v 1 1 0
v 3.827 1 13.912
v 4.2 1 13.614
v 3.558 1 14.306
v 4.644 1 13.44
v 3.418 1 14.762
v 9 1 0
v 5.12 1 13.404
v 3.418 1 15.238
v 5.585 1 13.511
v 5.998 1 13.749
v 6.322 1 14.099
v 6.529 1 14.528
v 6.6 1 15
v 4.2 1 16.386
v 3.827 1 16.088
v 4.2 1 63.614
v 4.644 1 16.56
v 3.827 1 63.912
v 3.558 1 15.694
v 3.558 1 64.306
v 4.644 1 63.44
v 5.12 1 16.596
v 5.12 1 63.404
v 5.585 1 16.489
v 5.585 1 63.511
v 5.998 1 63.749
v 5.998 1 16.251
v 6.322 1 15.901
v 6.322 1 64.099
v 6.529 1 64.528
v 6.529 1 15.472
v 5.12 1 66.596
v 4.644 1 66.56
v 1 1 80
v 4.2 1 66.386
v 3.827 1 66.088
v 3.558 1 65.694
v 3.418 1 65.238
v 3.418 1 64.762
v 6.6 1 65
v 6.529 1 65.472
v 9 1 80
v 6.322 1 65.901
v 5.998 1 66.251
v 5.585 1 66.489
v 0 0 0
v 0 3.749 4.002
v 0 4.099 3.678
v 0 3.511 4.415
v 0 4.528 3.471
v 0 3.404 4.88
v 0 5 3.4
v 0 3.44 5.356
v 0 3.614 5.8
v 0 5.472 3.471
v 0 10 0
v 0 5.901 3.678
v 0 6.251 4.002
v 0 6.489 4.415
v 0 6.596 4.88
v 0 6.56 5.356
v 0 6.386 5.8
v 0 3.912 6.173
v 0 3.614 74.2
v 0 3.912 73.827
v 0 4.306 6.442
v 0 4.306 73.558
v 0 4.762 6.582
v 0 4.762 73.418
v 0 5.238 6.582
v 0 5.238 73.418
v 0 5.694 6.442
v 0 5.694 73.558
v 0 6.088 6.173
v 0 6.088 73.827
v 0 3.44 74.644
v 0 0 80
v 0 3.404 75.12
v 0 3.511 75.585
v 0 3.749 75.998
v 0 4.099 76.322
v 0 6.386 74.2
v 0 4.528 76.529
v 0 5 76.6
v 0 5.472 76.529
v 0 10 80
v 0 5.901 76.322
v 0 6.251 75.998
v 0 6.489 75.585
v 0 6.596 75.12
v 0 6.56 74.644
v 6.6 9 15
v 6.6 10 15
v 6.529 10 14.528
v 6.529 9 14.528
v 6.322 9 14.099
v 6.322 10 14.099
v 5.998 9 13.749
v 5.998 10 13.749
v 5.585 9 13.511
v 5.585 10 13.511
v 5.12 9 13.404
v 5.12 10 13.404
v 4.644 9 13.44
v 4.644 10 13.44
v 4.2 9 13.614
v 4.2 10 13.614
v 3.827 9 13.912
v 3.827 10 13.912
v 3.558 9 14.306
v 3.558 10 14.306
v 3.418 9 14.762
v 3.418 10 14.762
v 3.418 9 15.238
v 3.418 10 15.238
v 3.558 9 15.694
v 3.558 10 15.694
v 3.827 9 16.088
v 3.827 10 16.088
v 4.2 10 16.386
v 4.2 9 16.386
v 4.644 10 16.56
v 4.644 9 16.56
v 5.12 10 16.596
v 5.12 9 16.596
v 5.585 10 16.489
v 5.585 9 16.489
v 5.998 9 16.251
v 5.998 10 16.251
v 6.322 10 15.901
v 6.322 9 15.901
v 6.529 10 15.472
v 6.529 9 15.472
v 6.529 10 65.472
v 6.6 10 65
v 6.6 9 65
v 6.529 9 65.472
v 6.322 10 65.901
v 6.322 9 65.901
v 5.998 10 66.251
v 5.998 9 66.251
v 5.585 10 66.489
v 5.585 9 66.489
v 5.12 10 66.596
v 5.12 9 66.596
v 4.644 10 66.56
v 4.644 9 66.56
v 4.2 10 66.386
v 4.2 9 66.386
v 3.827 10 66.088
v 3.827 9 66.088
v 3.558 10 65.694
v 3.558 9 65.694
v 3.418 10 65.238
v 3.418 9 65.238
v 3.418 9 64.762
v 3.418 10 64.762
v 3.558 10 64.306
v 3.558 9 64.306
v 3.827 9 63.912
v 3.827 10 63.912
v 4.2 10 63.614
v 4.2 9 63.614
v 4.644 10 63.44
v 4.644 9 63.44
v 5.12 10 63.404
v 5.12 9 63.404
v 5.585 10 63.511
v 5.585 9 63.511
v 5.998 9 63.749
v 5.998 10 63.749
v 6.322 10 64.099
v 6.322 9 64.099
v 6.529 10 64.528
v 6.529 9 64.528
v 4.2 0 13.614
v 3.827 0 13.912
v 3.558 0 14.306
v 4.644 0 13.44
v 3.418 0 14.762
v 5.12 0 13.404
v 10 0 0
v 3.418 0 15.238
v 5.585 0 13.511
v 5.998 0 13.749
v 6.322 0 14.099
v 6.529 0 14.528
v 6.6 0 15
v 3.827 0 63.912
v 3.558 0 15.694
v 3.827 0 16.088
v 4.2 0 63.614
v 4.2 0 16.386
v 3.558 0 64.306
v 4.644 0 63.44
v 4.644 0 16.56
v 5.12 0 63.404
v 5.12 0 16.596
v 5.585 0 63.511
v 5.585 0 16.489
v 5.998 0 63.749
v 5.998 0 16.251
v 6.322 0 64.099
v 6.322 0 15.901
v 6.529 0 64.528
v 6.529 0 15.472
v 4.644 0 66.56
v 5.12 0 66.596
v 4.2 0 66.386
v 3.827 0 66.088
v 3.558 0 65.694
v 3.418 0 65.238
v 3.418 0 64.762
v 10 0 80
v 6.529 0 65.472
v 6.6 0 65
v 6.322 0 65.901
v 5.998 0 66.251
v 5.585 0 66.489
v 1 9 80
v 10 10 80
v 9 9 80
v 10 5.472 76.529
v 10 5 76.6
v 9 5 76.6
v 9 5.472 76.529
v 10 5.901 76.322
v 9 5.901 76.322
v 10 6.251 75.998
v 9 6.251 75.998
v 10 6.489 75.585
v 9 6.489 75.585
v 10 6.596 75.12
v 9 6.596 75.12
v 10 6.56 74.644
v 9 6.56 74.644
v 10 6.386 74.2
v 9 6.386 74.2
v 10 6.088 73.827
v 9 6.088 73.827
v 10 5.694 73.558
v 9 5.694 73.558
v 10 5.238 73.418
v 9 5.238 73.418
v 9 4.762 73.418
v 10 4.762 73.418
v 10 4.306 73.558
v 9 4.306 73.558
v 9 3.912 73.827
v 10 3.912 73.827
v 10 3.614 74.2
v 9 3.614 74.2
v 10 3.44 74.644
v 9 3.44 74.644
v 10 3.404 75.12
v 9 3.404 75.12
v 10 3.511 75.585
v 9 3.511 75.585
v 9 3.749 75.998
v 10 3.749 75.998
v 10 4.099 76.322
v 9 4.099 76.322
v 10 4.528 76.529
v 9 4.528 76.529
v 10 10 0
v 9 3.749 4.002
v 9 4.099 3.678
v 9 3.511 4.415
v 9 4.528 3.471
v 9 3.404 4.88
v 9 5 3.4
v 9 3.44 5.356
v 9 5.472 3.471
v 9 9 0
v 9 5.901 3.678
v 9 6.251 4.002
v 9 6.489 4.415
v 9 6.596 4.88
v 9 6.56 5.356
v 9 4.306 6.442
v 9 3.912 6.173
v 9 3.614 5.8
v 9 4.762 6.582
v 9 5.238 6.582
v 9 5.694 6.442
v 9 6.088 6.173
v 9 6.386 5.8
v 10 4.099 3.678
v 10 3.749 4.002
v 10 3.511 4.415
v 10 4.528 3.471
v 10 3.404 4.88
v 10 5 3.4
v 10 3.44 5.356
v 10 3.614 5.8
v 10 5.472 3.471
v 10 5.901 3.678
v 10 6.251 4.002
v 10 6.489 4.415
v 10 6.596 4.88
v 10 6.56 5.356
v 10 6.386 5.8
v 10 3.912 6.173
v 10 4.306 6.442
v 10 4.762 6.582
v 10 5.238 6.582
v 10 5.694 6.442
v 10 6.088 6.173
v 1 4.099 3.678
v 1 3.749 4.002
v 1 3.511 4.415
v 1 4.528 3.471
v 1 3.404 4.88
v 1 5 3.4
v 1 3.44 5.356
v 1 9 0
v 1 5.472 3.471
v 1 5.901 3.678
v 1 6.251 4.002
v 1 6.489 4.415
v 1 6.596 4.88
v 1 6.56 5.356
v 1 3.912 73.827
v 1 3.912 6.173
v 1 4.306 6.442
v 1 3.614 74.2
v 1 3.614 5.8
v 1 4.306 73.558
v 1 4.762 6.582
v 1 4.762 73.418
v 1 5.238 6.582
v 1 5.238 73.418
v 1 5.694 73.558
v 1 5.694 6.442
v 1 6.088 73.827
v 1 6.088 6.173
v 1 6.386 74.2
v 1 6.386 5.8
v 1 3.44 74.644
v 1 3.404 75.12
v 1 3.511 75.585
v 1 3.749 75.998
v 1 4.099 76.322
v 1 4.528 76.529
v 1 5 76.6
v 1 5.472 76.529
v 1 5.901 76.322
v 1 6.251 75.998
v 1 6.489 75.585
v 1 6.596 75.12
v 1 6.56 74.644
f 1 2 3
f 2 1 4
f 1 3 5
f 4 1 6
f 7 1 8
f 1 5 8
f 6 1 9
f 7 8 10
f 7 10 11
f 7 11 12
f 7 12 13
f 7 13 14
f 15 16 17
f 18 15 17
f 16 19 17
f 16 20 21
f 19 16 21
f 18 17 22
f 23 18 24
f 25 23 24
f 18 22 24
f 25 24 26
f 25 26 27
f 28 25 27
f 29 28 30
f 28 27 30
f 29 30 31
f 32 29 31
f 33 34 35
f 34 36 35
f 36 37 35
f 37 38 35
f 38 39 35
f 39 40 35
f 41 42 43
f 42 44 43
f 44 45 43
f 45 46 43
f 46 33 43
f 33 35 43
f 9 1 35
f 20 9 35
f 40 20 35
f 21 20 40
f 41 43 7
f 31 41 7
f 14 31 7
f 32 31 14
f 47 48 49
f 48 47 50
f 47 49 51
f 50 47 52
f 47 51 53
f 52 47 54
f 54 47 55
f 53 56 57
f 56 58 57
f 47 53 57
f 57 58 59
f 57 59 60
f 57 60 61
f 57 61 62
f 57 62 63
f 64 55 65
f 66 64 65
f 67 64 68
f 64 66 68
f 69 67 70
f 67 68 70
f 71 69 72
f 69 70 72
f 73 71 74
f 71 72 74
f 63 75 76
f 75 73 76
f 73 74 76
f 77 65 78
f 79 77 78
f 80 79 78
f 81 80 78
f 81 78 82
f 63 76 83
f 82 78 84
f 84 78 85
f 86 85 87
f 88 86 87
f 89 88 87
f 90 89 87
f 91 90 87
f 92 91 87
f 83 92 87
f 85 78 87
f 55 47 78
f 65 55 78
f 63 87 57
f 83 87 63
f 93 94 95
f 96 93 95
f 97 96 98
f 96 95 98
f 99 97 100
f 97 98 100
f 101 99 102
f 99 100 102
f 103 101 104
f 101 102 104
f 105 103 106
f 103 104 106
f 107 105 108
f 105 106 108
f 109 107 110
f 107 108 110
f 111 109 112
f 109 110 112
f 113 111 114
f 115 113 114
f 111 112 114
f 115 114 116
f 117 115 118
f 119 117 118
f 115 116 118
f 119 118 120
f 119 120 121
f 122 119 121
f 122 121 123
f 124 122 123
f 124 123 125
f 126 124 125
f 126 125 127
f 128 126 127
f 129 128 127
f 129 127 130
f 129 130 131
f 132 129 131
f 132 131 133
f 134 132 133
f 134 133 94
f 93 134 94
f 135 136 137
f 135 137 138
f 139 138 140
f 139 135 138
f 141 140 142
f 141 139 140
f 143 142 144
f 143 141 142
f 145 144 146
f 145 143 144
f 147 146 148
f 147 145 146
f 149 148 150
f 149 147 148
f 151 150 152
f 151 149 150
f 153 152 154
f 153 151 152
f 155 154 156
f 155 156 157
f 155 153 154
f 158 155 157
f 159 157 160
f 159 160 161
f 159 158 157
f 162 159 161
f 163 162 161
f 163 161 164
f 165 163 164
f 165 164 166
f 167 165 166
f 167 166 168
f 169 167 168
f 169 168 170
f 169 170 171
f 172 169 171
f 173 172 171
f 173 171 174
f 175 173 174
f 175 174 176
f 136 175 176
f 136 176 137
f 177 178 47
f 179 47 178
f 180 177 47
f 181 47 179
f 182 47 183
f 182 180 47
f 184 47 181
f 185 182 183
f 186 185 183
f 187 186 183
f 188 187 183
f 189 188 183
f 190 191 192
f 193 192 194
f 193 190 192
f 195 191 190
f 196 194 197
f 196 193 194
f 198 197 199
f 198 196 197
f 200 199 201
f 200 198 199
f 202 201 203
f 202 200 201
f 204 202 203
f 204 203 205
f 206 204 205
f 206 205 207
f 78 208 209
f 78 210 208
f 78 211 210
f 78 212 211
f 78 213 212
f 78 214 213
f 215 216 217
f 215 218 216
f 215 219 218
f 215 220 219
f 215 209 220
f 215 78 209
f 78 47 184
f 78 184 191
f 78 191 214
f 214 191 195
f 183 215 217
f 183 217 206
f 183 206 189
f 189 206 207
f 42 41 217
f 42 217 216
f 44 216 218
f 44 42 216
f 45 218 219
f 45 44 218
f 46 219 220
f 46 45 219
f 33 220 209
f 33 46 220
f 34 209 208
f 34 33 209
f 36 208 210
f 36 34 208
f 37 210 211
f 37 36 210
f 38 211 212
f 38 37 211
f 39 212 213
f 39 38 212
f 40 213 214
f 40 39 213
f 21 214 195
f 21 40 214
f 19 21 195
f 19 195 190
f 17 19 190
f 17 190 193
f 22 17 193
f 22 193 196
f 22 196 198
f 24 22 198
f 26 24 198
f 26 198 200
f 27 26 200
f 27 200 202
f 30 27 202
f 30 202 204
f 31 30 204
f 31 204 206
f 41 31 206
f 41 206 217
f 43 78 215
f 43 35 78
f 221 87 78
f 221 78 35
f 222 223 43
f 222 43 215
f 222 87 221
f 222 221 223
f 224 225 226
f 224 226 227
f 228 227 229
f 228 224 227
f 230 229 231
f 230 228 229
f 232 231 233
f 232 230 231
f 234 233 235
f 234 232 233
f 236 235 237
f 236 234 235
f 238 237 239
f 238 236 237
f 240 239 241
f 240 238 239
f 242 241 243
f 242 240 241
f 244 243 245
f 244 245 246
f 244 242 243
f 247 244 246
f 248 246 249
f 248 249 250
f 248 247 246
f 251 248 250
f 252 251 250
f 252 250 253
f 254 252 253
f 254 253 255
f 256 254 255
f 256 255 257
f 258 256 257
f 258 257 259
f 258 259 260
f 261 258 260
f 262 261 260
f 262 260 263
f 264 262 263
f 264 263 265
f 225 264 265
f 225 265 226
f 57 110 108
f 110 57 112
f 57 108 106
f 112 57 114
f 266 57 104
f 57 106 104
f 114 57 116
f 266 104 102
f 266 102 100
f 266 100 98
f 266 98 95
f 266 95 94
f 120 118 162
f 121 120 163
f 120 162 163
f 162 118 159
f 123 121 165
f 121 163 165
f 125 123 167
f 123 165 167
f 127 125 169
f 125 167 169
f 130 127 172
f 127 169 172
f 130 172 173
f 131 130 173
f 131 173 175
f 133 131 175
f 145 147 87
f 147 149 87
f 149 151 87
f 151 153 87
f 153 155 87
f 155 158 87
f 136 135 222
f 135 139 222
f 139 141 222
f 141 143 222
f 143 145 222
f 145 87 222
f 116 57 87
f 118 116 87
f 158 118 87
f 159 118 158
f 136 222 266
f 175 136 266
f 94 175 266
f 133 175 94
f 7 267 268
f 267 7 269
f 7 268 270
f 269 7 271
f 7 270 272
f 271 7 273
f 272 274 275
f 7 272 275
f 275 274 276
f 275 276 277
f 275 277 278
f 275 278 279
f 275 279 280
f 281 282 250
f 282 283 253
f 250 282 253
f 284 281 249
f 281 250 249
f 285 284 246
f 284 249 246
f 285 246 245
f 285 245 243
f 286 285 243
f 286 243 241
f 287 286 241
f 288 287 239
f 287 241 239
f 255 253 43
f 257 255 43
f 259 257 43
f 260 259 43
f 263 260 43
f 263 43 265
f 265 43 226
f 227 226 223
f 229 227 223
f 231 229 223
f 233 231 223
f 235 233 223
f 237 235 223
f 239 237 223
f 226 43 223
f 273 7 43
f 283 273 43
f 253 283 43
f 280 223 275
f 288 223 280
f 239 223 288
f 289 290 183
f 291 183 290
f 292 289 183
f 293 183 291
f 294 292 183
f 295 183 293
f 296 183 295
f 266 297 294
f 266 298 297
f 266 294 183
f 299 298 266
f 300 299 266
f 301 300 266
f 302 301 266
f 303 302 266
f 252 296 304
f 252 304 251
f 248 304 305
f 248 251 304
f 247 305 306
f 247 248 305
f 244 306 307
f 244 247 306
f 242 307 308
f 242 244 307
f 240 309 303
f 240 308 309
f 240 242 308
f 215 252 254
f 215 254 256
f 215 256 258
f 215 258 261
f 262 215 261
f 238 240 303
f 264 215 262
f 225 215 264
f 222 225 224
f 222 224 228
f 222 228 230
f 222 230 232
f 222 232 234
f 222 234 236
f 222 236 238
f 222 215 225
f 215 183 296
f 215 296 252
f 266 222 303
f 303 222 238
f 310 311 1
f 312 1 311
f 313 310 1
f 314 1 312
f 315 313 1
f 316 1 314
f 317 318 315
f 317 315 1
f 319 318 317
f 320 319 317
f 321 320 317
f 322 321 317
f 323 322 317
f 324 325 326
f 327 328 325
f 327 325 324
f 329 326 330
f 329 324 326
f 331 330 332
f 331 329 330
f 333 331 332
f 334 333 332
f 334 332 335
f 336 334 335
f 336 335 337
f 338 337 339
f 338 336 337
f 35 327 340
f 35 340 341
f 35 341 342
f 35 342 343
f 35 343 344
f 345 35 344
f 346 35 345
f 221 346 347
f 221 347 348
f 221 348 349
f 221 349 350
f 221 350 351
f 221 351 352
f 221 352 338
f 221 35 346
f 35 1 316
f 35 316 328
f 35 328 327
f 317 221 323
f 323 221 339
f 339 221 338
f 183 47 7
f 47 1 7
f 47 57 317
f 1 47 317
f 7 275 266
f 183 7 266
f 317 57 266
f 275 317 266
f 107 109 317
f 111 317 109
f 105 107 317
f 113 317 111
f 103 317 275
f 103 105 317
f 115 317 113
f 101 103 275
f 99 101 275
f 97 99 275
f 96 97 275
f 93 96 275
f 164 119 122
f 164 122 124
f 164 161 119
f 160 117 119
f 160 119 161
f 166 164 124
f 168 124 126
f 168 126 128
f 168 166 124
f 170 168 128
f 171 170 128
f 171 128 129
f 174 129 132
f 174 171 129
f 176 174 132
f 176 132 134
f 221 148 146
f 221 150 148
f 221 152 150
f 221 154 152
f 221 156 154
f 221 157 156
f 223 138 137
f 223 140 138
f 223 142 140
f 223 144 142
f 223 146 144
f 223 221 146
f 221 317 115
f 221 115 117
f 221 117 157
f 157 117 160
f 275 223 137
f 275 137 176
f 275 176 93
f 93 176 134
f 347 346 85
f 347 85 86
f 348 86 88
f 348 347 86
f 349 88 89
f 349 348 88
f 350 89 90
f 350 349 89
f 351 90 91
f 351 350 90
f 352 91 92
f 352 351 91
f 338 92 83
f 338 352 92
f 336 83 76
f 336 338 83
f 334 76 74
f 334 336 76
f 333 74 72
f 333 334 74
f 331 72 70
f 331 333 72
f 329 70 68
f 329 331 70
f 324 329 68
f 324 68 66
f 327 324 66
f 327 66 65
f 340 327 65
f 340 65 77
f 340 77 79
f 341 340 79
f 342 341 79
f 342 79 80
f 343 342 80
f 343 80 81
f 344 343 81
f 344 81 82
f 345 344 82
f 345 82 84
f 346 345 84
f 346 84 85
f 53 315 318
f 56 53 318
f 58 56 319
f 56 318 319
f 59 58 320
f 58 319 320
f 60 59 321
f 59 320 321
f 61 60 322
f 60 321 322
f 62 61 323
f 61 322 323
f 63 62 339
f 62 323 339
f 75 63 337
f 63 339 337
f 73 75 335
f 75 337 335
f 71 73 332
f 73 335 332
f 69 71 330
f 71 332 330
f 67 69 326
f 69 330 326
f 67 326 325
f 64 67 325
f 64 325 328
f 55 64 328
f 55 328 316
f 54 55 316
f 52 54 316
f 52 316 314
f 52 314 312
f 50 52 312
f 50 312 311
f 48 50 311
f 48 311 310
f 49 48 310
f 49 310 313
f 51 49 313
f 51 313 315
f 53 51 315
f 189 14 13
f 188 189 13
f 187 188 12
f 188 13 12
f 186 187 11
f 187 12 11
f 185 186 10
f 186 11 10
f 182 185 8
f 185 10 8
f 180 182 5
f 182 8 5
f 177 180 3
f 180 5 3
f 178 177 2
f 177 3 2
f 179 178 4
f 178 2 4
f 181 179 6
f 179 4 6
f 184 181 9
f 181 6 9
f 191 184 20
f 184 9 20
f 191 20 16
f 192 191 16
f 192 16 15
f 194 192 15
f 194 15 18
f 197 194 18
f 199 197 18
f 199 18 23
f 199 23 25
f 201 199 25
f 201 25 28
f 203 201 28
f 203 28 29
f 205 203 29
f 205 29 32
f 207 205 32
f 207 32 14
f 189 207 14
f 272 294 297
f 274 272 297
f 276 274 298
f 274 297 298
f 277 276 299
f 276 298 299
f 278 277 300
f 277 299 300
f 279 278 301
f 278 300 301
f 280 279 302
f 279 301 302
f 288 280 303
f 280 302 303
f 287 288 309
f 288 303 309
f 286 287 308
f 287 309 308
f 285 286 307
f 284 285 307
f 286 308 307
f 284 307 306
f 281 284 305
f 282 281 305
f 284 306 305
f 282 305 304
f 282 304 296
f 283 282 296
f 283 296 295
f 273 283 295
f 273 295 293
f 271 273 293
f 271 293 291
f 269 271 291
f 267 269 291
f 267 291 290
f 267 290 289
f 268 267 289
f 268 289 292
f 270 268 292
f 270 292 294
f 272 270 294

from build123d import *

# Parameters (mm, degrees)
SKETCH_1_W          = 10
SKETCH_1_H          = 10
SKETCH_1_W_2        = 8
SKETCH_1_H_2        = 8
EXTRUDE_1_DEPTH     = 40
SKETCH_2_R          = 1.6
CUT_EXTRUDE_1_DEPTH = 11
SKETCH_3_R          = 1.6
CUT_EXTRUDE_2_DEPTH = 11


with BuildPart() as part:
    # ｽｹｯﾁ1 → ﾎﾞｽ - 押し出し1 (new body)
    with BuildSketch(Plane.XY):
        with Locations((5, 5)):
            Rectangle(SKETCH_1_W, SKETCH_1_H)
        with Locations((5, 5)):
            Rectangle(SKETCH_1_W_2, SKETCH_1_H_2, mode=Mode.SUBTRACT)
    extrude(amount=EXTRUDE_1_DEPTH)

    # ｽｹｯﾁ2 → ｶｯﾄ - 押し出し1 (cut, through all)
    with BuildSketch(Plane(origin=(10, 0, 0), x_dir=(0, 0, -1), z_dir=(1, 0, 0))):
        with Locations((-5, 5)):
            Circle(SKETCH_2_R)
    extrude(amount=-CUT_EXTRUDE_1_DEPTH, mode=Mode.SUBTRACT)

    # ｽｹｯﾁ3 → ｶｯﾄ - 押し出し2 (cut, through all)
    with BuildSketch(Plane(origin=(0, 10, 0), x_dir=(1, 0, 0), z_dir=(0, 1, 0))):
        with Locations((5, -15)):
            Circle(SKETCH_3_R)
    extrude(amount=-CUT_EXTRUDE_2_DEPTH, mode=Mode.SUBTRACT)

    # ﾐﾗｰ1: part across plane


with BuildPart() as part_1:
    add(part.part)
    add(part.part.mirror(Plane(origin=(0, 0, 40), x_dir=(1, 0, 0), z_dir=(0, 0, -1))))


solid = part_1.part
